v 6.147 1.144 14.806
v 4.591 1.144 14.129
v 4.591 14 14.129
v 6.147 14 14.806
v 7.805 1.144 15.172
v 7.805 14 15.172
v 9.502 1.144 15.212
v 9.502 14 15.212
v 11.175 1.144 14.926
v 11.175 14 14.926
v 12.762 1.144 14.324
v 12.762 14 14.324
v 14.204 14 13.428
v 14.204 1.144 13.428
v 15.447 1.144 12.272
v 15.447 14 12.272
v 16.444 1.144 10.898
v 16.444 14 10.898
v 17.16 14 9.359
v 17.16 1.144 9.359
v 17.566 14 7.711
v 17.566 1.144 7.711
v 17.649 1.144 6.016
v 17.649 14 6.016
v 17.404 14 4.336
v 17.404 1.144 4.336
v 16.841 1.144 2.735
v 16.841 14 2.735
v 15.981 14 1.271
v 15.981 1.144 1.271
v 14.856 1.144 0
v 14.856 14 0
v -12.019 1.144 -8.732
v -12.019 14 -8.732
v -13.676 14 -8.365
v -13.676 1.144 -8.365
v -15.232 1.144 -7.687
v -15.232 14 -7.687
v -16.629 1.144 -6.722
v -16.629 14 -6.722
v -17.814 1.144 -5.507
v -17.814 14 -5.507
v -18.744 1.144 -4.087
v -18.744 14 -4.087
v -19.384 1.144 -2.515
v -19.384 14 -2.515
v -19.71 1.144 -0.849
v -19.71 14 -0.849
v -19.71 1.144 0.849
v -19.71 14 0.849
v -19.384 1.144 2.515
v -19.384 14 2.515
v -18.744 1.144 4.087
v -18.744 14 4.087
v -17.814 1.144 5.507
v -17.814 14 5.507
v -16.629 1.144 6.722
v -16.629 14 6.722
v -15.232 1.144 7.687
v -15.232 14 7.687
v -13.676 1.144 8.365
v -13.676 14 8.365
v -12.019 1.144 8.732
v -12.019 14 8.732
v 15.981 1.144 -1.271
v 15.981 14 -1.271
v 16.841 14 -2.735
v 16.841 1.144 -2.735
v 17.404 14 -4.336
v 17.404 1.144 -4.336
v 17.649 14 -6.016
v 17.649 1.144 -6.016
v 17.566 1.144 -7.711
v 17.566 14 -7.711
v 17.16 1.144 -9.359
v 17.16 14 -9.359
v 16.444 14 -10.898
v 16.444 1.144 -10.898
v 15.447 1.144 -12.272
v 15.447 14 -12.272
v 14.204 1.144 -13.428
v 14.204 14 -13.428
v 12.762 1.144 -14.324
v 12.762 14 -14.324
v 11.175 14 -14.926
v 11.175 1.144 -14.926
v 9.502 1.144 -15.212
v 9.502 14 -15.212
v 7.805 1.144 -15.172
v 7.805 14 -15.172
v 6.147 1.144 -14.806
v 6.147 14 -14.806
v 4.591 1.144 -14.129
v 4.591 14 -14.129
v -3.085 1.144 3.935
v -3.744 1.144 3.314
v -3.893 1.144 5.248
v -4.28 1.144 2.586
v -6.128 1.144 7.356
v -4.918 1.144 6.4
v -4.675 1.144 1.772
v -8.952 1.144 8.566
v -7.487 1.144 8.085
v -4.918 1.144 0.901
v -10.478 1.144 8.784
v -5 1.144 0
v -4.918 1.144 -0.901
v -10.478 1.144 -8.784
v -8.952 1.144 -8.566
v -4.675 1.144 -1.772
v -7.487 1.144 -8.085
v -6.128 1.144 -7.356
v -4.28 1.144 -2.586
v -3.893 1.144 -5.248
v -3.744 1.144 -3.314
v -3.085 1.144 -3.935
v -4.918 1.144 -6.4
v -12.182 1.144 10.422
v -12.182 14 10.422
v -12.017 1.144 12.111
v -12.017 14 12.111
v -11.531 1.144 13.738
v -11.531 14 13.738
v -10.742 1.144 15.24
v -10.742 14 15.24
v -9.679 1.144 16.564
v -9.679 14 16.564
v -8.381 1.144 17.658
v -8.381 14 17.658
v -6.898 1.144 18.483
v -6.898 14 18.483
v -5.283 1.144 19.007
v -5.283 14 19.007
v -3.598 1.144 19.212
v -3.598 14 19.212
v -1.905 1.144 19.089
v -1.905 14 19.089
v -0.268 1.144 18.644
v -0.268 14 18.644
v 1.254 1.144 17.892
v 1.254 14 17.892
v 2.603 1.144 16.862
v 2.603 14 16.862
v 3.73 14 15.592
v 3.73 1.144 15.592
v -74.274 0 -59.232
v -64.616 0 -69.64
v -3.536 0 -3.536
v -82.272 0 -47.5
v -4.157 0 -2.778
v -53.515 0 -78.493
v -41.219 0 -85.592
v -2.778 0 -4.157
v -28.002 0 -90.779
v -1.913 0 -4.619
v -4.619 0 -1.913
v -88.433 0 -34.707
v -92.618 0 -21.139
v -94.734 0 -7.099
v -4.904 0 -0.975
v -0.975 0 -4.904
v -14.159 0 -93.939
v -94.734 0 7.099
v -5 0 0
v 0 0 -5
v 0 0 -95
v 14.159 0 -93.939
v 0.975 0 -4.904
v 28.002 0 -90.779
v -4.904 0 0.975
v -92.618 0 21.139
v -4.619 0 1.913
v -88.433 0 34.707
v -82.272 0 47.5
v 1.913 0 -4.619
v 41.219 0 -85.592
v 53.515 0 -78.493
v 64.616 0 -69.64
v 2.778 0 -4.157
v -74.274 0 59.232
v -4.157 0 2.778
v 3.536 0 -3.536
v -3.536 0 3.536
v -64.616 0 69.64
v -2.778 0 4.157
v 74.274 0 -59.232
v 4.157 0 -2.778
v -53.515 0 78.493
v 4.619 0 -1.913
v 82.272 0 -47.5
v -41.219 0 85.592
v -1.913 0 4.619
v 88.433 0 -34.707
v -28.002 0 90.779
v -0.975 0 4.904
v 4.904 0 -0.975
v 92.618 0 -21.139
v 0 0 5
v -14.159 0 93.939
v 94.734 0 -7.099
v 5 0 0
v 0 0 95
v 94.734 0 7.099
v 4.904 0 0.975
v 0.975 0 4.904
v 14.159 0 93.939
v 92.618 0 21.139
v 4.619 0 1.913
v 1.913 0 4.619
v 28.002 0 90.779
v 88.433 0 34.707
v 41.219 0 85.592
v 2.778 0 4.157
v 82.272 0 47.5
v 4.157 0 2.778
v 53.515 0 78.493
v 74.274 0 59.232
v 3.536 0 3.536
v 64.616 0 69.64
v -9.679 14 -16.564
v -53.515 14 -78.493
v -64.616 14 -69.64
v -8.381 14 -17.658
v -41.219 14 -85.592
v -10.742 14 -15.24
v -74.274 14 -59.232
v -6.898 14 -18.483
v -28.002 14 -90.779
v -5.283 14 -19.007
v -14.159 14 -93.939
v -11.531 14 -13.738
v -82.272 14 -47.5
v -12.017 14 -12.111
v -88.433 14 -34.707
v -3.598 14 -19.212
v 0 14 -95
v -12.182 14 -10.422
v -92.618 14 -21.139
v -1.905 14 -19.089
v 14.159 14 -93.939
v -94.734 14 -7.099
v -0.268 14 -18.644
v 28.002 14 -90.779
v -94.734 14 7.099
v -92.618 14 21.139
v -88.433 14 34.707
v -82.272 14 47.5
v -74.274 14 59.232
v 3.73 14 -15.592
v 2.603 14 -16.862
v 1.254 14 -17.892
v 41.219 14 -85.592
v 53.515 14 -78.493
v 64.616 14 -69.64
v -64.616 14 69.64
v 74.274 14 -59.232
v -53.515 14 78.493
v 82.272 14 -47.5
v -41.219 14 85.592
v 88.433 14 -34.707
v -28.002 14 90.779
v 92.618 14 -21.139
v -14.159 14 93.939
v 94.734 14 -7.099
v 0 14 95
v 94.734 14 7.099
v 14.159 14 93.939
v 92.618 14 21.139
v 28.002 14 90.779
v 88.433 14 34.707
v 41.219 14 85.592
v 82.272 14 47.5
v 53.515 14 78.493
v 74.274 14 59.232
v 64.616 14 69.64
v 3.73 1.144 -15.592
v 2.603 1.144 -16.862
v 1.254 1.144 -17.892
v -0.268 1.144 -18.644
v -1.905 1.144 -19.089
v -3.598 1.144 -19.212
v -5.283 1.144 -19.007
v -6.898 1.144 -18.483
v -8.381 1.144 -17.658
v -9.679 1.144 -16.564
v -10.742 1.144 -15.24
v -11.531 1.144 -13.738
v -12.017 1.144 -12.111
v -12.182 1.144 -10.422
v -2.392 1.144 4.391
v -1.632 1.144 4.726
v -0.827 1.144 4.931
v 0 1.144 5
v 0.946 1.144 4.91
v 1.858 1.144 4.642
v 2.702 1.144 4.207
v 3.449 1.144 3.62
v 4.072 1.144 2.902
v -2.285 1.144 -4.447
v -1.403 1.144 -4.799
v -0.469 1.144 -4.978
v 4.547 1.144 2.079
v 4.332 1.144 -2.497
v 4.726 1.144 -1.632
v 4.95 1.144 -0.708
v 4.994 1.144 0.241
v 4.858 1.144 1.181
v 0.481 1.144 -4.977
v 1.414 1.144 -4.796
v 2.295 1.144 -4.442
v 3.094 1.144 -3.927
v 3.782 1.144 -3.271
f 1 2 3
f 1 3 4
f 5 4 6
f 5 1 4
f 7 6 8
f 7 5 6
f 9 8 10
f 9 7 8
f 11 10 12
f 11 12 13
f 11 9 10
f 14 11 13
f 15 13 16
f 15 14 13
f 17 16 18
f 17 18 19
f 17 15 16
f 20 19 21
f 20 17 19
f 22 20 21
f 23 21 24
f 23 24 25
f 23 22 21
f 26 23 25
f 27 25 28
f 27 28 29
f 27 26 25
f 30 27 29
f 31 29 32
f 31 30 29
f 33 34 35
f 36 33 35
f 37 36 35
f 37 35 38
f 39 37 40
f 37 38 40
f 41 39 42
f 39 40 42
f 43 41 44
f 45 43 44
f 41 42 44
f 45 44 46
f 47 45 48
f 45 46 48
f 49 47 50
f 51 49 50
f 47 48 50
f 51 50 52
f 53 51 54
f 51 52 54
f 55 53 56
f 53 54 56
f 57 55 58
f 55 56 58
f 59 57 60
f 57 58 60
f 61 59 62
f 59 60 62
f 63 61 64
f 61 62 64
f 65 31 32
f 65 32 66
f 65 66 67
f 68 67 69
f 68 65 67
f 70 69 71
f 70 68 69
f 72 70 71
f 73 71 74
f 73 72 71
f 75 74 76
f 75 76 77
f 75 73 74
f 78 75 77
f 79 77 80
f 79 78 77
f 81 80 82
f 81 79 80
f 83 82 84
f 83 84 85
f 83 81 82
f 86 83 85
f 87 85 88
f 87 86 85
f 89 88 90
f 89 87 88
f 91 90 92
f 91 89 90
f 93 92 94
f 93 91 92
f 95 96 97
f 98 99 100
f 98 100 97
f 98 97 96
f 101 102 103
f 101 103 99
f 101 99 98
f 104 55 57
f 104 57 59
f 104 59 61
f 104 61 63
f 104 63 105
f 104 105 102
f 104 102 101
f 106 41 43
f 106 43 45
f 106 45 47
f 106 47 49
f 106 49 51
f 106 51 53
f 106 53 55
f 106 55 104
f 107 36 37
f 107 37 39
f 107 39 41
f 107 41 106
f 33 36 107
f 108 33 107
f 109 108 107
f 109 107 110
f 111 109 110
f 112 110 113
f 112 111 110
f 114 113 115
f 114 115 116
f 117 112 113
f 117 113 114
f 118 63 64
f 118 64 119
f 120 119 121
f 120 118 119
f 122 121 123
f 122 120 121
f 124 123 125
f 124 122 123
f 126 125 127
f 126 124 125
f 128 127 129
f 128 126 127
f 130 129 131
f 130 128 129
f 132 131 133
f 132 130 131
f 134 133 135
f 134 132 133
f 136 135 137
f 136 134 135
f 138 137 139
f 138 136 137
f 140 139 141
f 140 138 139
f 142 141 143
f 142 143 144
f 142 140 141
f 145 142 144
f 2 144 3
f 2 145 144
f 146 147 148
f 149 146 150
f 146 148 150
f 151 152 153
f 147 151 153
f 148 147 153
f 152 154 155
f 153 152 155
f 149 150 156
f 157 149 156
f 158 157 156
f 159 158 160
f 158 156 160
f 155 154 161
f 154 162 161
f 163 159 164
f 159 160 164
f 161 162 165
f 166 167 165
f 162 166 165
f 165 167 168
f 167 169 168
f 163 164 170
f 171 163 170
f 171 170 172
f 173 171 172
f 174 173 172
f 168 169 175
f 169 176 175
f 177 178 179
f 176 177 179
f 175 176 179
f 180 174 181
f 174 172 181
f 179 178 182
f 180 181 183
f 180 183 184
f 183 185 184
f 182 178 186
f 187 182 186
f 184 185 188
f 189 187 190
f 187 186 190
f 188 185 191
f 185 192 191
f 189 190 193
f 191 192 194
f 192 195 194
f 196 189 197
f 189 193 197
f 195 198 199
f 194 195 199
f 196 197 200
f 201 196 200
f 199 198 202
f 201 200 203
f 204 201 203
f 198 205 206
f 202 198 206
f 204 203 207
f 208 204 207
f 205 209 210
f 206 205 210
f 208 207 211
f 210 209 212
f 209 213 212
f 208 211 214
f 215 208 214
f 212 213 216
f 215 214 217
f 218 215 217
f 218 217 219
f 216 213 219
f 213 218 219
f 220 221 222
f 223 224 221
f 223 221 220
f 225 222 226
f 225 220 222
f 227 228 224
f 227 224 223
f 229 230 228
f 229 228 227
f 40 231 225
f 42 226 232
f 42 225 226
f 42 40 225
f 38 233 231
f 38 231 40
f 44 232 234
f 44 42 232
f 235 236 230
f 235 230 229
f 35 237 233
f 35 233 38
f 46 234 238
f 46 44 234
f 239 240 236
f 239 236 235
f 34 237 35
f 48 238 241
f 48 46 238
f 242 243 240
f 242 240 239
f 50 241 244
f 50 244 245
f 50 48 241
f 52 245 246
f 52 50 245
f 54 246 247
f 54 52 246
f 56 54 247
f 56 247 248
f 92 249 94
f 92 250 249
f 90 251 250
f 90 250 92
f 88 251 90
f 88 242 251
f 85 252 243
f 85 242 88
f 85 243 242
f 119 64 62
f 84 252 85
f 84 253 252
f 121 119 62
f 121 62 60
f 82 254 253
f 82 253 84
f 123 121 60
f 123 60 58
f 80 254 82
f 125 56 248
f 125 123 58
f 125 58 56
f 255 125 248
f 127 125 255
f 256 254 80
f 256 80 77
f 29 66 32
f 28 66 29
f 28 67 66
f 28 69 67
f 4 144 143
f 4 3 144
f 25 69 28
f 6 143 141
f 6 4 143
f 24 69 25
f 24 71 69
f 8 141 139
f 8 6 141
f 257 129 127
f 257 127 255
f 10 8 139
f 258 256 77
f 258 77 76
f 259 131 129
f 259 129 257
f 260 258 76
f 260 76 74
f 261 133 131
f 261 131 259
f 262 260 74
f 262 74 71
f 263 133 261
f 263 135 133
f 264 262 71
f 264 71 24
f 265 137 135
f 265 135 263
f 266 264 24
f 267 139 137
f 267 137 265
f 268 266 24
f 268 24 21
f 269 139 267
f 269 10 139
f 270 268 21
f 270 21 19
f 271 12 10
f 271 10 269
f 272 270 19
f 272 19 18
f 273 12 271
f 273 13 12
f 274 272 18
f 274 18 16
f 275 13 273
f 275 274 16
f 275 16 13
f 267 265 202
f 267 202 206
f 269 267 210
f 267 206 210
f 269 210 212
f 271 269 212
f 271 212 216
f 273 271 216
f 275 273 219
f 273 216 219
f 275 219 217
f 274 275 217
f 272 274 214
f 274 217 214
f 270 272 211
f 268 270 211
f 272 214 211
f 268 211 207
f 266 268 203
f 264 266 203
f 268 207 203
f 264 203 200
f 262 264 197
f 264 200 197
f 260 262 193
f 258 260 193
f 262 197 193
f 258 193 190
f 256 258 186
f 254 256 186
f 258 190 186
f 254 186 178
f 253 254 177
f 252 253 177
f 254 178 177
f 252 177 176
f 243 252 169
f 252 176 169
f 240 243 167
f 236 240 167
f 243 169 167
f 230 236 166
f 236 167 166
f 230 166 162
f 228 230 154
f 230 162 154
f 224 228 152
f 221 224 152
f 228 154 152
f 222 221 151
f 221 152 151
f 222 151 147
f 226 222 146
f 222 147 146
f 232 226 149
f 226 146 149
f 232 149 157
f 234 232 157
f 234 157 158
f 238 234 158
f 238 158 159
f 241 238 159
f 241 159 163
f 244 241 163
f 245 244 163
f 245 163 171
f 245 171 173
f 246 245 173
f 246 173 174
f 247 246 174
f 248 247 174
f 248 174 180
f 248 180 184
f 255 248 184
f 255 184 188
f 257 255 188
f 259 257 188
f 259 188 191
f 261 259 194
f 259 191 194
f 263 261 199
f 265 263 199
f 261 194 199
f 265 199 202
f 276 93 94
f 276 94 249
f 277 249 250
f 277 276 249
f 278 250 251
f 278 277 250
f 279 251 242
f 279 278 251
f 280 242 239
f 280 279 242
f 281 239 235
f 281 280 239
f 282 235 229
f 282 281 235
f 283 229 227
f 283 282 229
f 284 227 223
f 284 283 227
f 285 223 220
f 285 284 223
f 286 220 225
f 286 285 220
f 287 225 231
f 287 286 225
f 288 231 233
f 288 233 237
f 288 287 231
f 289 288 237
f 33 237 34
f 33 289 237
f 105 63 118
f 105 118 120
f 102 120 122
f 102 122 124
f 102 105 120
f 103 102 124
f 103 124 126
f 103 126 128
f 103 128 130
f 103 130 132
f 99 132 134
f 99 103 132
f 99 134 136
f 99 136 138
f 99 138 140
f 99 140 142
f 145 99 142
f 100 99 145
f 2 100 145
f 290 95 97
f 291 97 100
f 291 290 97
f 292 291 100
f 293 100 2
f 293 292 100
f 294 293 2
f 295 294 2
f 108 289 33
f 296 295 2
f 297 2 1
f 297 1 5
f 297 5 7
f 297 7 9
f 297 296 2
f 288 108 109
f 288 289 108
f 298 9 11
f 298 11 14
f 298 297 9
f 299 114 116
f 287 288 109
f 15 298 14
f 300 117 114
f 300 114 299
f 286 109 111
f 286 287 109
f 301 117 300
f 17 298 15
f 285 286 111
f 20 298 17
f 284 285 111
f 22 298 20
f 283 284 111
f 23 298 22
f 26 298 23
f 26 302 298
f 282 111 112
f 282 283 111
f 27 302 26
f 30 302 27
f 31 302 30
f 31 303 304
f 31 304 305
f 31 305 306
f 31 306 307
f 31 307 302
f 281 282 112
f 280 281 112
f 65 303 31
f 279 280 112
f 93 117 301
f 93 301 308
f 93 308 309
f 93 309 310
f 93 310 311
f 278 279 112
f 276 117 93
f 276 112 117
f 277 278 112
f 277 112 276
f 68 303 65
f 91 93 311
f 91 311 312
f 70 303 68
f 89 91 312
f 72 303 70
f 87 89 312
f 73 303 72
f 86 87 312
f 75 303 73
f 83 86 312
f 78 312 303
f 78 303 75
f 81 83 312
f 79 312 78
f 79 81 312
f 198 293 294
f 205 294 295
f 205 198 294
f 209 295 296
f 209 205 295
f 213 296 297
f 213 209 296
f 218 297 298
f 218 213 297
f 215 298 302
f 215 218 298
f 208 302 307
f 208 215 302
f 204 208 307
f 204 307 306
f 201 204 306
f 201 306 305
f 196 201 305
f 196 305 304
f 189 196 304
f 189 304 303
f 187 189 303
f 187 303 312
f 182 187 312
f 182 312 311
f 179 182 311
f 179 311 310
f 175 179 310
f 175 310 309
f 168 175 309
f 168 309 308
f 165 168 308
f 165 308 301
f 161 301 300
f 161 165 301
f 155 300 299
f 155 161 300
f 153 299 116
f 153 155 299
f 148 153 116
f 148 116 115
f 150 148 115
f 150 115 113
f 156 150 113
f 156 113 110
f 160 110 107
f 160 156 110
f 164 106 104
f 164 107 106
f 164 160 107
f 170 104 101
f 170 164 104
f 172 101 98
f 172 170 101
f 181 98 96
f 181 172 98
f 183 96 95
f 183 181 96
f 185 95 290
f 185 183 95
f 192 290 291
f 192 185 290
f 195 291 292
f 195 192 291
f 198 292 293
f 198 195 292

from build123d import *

# Parameters (mm, degrees)
SKETCH1_R           = 95
BOSS_EXTRUDE1_DEPTH = 14
SKETCH2_R           = 5
CUT_EXTRUDE1_DEPTH  = 136.077755386
SKETCH3_R           = 8.797146217
CUT_EXTRUDE2_DEPTH  = 12.856004293
CIRPATTERN1_COUNT   = 5


with BuildPart() as part:
    # Sketch1 → Boss-Extrude1 (new body)
    with BuildSketch(Plane(origin=(0, 0, 0), x_dir=(1, 0, 0), z_dir=(0, 1, 0))):
        Circle(SKETCH1_R)
    extrude(amount=BOSS_EXTRUDE1_DEPTH)

    # Sketch2 → Cut-Extrude1 (cut, through all)
    with BuildSketch(Plane(origin=(0, 0, 0), x_dir=(1, 0, 0), z_dir=(0, 1, 0))):
        Circle(SKETCH2_R)
    extrude(amount=CUT_EXTRUDE1_DEPTH, mode=Mode.SUBTRACT)

    # Sketch3 → Cut-Extrude2 (cut)
    with BuildSketch(Plane(origin=(0, 14, 0), x_dir=(1, 0, 0), z_dir=(0, 1, 0))):
        with Locations((-10.953492751, 0)):
            Circle(SKETCH3_R)
    cut_extrude2 = extrude(amount=-CUT_EXTRUDE2_DEPTH, mode=Mode.SUBTRACT)

    # CirPattern1: Cut-Extrude2 ×5 about axis
    cirpattern1_axis = Axis((0, 0, 0), (0, 1, 0))
    for i in range(1, CIRPATTERN1_COUNT):
        add(cut_extrude2.rotate(cirpattern1_axis, i * 360 / CIRPATTERN1_COUNT), mode=Mode.SUBTRACT)


solid = part.part
